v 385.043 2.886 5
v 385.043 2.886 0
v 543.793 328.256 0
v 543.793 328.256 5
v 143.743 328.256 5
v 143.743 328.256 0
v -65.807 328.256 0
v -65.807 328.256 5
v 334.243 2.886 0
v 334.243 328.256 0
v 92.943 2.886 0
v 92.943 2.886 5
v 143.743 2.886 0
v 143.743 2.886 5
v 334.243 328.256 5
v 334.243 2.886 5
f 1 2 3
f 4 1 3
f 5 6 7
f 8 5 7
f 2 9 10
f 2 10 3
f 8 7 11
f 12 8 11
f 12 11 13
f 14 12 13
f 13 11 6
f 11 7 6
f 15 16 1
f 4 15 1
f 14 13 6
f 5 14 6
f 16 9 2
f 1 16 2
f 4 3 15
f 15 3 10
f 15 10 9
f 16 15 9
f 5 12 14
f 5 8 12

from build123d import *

# Parameters (mm, degrees)
EXTRUDE_1_DEPTH   = 5
EXTRUDE_1_2_DEPTH = 5


with BuildPart() as part:
    # 草图1 → 凸台-拉伸1 (new body)
    with BuildSketch(Plane.XY):
        Polygon((92.942718044, 2.885977654), (143.742718044, 2.885977654), (143.742718044, 328.255977654), (-65.807281956, 328.255977654), align=None)
    extrude(amount=EXTRUDE_1_DEPTH)


with BuildPart() as body_2:
    # 草图1 → Extrude 1 2 (new body)
    with BuildSketch(Plane.XY):
        Polygon((334.242718044, 328.255977654), (334.242718044, 2.885977654), (385.042718044, 2.885977654), (543.792718044, 328.255977654), align=None)
    extrude(amount=EXTRUDE_1_2_DEPTH)


solid = Compound([part.part, body_2.part])
